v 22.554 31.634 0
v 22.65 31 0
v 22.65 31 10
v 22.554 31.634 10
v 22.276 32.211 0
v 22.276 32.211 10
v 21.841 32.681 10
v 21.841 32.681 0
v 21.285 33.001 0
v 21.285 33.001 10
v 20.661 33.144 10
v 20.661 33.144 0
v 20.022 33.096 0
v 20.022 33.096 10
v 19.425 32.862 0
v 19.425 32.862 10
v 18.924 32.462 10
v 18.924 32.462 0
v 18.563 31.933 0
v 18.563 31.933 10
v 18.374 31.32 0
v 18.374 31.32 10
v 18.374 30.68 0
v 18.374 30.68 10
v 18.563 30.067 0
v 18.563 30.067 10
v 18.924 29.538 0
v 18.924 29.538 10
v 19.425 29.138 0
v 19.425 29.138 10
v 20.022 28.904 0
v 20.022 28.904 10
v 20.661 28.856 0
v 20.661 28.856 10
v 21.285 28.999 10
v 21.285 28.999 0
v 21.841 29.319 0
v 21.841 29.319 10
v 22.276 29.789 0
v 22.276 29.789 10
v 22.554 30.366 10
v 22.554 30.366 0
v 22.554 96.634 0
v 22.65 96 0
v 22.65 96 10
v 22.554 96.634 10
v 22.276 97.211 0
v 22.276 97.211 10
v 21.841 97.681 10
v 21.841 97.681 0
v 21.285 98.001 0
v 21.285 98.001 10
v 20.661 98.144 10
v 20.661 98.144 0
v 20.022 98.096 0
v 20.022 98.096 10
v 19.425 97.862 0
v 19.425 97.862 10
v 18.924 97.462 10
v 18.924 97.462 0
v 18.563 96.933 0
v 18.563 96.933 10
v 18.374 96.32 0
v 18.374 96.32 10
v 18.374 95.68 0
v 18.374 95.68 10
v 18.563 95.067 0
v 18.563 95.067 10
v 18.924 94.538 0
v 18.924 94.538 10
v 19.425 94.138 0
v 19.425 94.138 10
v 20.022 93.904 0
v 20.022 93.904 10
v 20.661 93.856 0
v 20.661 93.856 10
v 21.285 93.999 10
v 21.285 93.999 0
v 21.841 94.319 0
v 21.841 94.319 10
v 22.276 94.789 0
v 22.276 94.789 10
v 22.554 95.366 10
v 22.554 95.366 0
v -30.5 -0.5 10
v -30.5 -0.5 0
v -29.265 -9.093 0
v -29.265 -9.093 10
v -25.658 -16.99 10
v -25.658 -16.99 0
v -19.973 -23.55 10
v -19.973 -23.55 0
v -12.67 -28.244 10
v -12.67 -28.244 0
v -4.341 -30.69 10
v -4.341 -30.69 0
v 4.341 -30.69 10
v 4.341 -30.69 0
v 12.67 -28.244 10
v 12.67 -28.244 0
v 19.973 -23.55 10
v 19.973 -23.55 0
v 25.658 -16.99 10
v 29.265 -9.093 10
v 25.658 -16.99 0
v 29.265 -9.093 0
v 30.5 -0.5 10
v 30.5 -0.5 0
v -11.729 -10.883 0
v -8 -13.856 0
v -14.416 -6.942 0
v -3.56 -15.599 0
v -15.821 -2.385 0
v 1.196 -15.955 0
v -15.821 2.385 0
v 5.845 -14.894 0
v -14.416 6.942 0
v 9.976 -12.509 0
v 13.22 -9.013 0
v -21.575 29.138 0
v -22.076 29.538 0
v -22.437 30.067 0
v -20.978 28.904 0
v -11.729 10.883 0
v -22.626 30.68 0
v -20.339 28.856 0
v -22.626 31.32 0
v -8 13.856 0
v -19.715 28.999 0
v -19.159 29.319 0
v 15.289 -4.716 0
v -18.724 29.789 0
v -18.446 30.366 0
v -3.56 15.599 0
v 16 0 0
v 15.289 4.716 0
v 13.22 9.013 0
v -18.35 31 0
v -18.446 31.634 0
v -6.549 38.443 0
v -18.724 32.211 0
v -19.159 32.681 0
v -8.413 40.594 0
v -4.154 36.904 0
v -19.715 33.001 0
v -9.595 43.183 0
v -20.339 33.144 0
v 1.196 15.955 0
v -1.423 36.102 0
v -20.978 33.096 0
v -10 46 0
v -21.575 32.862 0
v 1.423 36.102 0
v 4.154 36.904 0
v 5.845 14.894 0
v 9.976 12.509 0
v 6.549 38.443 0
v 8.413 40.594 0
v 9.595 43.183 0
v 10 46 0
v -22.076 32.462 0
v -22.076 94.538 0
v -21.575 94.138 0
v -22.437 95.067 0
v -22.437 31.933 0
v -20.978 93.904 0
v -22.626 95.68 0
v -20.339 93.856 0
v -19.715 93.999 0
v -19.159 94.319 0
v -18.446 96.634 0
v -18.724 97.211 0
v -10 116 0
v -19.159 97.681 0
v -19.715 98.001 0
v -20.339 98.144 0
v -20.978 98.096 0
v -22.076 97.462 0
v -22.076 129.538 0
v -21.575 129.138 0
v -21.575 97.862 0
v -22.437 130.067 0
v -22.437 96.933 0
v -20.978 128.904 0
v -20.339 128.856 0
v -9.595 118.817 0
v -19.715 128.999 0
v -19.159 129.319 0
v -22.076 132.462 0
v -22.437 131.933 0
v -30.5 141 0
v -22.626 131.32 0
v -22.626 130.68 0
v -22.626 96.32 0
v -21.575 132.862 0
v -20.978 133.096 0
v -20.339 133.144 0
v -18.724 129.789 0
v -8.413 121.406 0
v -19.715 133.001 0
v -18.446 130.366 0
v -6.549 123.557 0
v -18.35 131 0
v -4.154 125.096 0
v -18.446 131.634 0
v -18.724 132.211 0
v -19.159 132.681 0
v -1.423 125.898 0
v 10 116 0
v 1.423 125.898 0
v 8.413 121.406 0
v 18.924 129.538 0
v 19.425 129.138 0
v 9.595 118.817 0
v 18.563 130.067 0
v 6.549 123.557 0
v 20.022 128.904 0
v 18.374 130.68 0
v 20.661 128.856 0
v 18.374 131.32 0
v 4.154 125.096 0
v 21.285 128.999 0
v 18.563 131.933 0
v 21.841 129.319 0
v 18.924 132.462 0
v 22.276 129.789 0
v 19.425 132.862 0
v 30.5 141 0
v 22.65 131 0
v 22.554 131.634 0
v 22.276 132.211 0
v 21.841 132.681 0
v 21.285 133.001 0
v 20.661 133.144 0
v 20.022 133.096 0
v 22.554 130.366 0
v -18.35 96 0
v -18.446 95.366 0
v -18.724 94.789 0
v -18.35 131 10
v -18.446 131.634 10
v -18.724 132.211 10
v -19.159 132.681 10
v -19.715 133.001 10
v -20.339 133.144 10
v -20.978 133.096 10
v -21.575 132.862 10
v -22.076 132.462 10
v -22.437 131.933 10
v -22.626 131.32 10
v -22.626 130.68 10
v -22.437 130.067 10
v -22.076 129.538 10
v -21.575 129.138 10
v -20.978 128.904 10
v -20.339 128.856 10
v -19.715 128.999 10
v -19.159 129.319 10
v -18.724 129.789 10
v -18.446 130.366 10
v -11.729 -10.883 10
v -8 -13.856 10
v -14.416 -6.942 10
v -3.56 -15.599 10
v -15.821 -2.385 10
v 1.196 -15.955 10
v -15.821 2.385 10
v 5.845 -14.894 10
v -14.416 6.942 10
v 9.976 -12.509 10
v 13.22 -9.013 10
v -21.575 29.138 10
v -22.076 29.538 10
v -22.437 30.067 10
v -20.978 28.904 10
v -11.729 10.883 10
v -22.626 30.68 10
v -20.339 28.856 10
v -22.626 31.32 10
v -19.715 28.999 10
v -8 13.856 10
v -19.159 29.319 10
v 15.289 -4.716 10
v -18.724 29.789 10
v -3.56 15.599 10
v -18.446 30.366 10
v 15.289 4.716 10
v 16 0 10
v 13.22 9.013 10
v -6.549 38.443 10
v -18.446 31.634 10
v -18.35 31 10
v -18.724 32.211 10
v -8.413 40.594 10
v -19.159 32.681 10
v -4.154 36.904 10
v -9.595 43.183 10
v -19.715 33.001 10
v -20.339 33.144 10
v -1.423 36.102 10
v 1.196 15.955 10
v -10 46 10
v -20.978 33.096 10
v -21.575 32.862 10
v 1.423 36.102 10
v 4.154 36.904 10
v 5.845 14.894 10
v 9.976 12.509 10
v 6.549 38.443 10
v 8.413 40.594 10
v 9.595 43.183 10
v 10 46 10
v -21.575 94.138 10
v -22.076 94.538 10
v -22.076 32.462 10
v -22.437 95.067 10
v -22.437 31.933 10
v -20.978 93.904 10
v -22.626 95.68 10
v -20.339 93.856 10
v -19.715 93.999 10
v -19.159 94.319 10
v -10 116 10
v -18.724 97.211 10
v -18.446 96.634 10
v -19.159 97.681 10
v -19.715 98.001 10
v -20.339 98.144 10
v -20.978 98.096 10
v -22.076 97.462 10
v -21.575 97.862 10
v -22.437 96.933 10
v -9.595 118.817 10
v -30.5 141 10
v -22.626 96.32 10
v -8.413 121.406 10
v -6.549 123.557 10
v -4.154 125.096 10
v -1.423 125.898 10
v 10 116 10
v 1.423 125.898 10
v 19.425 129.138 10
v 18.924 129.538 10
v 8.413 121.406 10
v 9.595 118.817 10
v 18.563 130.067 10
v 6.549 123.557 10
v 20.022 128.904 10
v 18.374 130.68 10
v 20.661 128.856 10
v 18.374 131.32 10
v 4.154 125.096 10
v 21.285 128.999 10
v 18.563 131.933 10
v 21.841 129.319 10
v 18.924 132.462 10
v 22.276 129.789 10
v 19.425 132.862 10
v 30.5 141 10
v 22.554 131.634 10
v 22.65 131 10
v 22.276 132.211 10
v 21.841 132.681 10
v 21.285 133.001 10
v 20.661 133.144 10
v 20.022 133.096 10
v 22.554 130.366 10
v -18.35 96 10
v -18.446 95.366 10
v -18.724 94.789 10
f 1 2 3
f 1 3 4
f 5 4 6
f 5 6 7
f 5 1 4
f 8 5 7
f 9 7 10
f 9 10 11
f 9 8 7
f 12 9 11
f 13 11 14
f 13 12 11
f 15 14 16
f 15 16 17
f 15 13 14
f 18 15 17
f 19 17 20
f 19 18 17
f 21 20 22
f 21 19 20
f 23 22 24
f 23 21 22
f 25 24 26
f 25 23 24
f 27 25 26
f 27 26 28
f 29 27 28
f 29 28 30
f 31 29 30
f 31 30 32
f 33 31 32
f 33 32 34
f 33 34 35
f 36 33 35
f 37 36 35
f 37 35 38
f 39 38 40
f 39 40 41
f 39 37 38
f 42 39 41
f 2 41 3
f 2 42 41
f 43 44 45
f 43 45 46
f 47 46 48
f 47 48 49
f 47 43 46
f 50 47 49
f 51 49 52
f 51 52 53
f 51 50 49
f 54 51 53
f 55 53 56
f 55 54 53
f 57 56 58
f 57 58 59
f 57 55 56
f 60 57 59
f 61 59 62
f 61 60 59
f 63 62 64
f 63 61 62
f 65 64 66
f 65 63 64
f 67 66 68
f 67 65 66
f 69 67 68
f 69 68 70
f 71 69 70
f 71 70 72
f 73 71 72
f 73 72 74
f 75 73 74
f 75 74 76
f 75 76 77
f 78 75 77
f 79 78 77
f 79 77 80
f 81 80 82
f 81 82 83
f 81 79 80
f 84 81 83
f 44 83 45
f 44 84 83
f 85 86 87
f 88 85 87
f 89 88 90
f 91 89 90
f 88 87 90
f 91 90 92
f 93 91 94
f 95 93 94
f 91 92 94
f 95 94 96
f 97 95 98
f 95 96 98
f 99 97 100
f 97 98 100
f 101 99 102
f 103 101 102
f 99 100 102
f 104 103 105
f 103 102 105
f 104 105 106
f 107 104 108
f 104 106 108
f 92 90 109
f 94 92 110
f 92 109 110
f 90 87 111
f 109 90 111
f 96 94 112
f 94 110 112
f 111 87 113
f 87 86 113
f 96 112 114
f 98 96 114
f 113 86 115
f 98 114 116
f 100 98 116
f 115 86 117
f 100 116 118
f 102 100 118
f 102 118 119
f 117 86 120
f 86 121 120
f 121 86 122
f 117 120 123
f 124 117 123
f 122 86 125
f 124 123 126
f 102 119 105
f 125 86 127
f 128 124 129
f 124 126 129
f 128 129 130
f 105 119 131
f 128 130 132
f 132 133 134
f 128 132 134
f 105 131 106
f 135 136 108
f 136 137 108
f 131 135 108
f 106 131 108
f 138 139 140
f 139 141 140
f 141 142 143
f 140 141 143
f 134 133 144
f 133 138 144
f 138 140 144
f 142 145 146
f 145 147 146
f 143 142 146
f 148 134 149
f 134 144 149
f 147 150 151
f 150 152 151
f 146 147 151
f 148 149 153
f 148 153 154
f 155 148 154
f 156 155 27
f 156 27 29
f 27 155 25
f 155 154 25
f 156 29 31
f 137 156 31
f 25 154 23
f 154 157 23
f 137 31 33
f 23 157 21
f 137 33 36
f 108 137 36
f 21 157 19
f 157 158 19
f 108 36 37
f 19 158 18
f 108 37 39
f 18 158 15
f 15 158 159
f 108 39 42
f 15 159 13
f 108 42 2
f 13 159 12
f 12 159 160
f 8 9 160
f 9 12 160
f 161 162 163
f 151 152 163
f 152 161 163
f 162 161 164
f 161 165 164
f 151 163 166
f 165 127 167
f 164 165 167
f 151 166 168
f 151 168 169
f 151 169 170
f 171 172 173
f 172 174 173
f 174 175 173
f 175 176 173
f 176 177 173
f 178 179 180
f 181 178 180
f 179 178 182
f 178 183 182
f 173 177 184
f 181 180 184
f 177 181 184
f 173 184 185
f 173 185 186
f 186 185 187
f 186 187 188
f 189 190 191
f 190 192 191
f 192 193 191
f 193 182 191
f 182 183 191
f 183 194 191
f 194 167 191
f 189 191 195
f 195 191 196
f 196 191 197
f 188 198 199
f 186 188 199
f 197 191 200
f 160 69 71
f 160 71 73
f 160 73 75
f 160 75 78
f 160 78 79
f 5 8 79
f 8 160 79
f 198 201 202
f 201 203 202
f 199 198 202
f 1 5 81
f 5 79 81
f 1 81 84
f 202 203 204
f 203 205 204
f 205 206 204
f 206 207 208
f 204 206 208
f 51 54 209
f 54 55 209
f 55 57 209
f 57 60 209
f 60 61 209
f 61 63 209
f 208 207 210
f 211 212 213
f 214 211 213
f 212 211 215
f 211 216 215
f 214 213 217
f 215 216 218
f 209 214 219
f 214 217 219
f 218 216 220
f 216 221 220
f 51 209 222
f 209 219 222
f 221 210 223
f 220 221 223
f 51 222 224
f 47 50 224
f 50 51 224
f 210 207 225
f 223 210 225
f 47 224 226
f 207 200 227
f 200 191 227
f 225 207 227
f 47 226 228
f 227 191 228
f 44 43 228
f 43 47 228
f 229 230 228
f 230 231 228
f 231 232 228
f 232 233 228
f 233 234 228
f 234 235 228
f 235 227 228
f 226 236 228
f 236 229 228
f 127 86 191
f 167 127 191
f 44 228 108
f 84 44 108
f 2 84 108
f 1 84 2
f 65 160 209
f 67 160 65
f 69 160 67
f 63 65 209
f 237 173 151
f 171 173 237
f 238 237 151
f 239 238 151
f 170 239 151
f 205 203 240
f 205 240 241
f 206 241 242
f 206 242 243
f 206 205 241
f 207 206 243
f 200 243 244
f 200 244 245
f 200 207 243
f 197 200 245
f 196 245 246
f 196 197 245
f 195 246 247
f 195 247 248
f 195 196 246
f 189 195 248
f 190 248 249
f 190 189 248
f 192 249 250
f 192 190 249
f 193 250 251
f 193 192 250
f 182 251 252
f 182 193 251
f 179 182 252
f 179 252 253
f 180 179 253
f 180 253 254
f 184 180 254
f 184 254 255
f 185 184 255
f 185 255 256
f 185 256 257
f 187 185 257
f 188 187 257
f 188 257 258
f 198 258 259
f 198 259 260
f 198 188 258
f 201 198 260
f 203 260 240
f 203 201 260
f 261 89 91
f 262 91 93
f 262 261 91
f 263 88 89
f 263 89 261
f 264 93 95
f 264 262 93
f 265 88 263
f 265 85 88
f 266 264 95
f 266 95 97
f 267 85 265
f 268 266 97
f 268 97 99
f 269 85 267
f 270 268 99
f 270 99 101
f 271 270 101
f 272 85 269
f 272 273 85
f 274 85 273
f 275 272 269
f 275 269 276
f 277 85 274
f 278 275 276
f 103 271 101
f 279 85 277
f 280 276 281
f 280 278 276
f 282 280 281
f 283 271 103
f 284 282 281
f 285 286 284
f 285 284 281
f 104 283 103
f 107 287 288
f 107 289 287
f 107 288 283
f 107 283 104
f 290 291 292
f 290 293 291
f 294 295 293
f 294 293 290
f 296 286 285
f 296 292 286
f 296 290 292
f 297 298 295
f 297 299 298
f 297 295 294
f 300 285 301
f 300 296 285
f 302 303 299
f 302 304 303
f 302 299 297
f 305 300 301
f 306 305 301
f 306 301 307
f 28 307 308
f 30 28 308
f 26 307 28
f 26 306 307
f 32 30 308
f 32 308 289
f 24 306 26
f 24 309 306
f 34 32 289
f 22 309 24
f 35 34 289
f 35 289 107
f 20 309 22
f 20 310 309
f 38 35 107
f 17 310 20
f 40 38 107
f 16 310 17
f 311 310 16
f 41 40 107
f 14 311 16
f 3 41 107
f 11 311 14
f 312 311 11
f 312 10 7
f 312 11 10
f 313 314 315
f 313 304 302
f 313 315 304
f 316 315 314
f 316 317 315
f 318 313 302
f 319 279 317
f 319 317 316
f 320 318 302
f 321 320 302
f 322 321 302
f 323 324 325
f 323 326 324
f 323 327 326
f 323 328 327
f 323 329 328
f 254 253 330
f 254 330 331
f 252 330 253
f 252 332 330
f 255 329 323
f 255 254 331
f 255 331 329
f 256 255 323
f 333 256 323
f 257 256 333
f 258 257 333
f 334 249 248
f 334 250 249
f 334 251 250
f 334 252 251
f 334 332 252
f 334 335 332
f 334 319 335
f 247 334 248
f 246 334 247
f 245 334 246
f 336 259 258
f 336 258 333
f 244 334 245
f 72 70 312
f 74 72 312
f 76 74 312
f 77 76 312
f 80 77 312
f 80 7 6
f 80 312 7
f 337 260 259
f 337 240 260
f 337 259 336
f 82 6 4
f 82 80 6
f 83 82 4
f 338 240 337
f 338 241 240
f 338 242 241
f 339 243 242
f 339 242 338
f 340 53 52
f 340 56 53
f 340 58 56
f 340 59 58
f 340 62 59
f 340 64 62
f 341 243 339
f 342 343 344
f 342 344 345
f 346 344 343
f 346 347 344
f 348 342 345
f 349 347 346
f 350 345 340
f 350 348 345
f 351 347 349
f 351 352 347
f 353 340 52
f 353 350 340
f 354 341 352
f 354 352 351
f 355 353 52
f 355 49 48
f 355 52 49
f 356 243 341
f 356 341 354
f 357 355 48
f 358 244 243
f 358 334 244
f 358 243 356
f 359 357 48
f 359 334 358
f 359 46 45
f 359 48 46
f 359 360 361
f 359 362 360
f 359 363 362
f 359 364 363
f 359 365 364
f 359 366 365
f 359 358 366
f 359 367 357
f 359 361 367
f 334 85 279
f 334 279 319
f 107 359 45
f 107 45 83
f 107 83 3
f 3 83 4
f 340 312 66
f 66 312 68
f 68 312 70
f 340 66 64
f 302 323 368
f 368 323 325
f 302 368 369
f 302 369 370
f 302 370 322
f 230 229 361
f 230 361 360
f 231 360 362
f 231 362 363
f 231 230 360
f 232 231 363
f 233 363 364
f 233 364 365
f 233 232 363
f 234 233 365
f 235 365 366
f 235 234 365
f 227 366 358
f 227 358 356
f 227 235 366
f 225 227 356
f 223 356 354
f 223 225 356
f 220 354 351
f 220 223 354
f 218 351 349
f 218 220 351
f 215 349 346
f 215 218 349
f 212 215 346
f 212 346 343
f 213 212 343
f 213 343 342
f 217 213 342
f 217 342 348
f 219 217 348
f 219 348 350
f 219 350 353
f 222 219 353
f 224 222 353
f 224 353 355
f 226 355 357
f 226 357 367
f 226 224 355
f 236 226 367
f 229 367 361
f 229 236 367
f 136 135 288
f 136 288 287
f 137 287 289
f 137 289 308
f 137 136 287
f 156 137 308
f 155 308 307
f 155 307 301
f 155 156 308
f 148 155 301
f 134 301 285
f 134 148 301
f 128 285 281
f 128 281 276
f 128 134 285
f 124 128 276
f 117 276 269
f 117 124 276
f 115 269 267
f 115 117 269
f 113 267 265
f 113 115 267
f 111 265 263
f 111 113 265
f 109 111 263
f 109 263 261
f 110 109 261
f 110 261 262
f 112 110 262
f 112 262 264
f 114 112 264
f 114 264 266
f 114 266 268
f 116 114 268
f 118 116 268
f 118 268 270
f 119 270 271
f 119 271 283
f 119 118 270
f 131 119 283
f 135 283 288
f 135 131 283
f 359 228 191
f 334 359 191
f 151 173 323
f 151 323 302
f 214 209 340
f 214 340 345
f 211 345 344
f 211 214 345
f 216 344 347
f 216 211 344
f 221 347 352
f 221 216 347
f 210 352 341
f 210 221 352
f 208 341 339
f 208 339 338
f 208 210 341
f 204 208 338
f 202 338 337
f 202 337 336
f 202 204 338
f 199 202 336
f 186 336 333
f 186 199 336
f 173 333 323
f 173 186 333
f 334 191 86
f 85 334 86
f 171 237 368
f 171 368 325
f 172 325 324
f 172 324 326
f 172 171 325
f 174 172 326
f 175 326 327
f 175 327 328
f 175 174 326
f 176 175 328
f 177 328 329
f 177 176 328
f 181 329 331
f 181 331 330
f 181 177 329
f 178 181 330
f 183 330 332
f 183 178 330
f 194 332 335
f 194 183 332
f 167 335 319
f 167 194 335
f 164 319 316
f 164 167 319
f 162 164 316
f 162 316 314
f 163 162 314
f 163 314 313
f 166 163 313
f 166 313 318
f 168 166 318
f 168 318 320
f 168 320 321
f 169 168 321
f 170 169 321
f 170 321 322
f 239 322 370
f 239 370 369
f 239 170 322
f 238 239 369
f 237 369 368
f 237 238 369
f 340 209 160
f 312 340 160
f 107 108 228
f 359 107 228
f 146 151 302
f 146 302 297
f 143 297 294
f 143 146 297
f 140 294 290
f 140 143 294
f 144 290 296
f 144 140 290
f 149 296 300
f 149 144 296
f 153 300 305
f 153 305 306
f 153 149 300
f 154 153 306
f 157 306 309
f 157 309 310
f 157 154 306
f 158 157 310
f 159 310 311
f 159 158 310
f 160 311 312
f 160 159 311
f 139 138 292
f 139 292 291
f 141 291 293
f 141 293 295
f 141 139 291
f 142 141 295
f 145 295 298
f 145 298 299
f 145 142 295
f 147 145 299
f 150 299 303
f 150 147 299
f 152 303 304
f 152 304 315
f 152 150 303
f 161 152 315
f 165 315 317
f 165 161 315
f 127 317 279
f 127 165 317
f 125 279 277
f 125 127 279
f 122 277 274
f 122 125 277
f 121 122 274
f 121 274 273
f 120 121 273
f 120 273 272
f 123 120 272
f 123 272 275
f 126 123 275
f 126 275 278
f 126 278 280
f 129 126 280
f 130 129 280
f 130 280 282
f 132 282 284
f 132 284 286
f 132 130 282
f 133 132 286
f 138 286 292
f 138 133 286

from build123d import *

# Parameters (mm, degrees)
SKETCH_R   = 2.15
SKETCH_R_2 = 16
PAD_DEPTH  = 10


with BuildPart() as part:
    # Sketch → Pad (new body)
    with BuildSketch(Plane.XY):
        with BuildLine():
            Line((-30.5, 141), (-30.5, -0.5))
            ThreePointArc((-30.5, -0.5), (0, -31), (30.5, -0.5))
            Line((30.5, -0.5), (30.5, 141))
            Line((30.5, 141), (-30.5, 141))
        make_face()
        with Locations((-20.5, 131)):
            Circle(SKETCH_R, mode=Mode.SUBTRACT)
        with Locations((20.5, 131)):
            Circle(SKETCH_R, mode=Mode.SUBTRACT)
        with Locations((-20.5, 96)):
            Circle(SKETCH_R, mode=Mode.SUBTRACT)
        with Locations((20.5, 96)):
            Circle(SKETCH_R, mode=Mode.SUBTRACT)
        Circle(SKETCH_R_2, mode=Mode.SUBTRACT)
        with Locations((-20.5, 31)):
            Circle(SKETCH_R, mode=Mode.SUBTRACT)
        with Locations((20.5, 31)):
            Circle(SKETCH_R, mode=Mode.SUBTRACT)
        with BuildLine():
            ThreePointArc((10, 116), (0, 126), (-10, 116))
            Line((-10, 116), (-10, 46))
            ThreePointArc((-10, 46), (0, 36), (10, 46))
            Line((10, 116), (10, 46))
        make_face(mode=Mode.SUBTRACT)
    extrude(amount=PAD_DEPTH)


solid = part.part
